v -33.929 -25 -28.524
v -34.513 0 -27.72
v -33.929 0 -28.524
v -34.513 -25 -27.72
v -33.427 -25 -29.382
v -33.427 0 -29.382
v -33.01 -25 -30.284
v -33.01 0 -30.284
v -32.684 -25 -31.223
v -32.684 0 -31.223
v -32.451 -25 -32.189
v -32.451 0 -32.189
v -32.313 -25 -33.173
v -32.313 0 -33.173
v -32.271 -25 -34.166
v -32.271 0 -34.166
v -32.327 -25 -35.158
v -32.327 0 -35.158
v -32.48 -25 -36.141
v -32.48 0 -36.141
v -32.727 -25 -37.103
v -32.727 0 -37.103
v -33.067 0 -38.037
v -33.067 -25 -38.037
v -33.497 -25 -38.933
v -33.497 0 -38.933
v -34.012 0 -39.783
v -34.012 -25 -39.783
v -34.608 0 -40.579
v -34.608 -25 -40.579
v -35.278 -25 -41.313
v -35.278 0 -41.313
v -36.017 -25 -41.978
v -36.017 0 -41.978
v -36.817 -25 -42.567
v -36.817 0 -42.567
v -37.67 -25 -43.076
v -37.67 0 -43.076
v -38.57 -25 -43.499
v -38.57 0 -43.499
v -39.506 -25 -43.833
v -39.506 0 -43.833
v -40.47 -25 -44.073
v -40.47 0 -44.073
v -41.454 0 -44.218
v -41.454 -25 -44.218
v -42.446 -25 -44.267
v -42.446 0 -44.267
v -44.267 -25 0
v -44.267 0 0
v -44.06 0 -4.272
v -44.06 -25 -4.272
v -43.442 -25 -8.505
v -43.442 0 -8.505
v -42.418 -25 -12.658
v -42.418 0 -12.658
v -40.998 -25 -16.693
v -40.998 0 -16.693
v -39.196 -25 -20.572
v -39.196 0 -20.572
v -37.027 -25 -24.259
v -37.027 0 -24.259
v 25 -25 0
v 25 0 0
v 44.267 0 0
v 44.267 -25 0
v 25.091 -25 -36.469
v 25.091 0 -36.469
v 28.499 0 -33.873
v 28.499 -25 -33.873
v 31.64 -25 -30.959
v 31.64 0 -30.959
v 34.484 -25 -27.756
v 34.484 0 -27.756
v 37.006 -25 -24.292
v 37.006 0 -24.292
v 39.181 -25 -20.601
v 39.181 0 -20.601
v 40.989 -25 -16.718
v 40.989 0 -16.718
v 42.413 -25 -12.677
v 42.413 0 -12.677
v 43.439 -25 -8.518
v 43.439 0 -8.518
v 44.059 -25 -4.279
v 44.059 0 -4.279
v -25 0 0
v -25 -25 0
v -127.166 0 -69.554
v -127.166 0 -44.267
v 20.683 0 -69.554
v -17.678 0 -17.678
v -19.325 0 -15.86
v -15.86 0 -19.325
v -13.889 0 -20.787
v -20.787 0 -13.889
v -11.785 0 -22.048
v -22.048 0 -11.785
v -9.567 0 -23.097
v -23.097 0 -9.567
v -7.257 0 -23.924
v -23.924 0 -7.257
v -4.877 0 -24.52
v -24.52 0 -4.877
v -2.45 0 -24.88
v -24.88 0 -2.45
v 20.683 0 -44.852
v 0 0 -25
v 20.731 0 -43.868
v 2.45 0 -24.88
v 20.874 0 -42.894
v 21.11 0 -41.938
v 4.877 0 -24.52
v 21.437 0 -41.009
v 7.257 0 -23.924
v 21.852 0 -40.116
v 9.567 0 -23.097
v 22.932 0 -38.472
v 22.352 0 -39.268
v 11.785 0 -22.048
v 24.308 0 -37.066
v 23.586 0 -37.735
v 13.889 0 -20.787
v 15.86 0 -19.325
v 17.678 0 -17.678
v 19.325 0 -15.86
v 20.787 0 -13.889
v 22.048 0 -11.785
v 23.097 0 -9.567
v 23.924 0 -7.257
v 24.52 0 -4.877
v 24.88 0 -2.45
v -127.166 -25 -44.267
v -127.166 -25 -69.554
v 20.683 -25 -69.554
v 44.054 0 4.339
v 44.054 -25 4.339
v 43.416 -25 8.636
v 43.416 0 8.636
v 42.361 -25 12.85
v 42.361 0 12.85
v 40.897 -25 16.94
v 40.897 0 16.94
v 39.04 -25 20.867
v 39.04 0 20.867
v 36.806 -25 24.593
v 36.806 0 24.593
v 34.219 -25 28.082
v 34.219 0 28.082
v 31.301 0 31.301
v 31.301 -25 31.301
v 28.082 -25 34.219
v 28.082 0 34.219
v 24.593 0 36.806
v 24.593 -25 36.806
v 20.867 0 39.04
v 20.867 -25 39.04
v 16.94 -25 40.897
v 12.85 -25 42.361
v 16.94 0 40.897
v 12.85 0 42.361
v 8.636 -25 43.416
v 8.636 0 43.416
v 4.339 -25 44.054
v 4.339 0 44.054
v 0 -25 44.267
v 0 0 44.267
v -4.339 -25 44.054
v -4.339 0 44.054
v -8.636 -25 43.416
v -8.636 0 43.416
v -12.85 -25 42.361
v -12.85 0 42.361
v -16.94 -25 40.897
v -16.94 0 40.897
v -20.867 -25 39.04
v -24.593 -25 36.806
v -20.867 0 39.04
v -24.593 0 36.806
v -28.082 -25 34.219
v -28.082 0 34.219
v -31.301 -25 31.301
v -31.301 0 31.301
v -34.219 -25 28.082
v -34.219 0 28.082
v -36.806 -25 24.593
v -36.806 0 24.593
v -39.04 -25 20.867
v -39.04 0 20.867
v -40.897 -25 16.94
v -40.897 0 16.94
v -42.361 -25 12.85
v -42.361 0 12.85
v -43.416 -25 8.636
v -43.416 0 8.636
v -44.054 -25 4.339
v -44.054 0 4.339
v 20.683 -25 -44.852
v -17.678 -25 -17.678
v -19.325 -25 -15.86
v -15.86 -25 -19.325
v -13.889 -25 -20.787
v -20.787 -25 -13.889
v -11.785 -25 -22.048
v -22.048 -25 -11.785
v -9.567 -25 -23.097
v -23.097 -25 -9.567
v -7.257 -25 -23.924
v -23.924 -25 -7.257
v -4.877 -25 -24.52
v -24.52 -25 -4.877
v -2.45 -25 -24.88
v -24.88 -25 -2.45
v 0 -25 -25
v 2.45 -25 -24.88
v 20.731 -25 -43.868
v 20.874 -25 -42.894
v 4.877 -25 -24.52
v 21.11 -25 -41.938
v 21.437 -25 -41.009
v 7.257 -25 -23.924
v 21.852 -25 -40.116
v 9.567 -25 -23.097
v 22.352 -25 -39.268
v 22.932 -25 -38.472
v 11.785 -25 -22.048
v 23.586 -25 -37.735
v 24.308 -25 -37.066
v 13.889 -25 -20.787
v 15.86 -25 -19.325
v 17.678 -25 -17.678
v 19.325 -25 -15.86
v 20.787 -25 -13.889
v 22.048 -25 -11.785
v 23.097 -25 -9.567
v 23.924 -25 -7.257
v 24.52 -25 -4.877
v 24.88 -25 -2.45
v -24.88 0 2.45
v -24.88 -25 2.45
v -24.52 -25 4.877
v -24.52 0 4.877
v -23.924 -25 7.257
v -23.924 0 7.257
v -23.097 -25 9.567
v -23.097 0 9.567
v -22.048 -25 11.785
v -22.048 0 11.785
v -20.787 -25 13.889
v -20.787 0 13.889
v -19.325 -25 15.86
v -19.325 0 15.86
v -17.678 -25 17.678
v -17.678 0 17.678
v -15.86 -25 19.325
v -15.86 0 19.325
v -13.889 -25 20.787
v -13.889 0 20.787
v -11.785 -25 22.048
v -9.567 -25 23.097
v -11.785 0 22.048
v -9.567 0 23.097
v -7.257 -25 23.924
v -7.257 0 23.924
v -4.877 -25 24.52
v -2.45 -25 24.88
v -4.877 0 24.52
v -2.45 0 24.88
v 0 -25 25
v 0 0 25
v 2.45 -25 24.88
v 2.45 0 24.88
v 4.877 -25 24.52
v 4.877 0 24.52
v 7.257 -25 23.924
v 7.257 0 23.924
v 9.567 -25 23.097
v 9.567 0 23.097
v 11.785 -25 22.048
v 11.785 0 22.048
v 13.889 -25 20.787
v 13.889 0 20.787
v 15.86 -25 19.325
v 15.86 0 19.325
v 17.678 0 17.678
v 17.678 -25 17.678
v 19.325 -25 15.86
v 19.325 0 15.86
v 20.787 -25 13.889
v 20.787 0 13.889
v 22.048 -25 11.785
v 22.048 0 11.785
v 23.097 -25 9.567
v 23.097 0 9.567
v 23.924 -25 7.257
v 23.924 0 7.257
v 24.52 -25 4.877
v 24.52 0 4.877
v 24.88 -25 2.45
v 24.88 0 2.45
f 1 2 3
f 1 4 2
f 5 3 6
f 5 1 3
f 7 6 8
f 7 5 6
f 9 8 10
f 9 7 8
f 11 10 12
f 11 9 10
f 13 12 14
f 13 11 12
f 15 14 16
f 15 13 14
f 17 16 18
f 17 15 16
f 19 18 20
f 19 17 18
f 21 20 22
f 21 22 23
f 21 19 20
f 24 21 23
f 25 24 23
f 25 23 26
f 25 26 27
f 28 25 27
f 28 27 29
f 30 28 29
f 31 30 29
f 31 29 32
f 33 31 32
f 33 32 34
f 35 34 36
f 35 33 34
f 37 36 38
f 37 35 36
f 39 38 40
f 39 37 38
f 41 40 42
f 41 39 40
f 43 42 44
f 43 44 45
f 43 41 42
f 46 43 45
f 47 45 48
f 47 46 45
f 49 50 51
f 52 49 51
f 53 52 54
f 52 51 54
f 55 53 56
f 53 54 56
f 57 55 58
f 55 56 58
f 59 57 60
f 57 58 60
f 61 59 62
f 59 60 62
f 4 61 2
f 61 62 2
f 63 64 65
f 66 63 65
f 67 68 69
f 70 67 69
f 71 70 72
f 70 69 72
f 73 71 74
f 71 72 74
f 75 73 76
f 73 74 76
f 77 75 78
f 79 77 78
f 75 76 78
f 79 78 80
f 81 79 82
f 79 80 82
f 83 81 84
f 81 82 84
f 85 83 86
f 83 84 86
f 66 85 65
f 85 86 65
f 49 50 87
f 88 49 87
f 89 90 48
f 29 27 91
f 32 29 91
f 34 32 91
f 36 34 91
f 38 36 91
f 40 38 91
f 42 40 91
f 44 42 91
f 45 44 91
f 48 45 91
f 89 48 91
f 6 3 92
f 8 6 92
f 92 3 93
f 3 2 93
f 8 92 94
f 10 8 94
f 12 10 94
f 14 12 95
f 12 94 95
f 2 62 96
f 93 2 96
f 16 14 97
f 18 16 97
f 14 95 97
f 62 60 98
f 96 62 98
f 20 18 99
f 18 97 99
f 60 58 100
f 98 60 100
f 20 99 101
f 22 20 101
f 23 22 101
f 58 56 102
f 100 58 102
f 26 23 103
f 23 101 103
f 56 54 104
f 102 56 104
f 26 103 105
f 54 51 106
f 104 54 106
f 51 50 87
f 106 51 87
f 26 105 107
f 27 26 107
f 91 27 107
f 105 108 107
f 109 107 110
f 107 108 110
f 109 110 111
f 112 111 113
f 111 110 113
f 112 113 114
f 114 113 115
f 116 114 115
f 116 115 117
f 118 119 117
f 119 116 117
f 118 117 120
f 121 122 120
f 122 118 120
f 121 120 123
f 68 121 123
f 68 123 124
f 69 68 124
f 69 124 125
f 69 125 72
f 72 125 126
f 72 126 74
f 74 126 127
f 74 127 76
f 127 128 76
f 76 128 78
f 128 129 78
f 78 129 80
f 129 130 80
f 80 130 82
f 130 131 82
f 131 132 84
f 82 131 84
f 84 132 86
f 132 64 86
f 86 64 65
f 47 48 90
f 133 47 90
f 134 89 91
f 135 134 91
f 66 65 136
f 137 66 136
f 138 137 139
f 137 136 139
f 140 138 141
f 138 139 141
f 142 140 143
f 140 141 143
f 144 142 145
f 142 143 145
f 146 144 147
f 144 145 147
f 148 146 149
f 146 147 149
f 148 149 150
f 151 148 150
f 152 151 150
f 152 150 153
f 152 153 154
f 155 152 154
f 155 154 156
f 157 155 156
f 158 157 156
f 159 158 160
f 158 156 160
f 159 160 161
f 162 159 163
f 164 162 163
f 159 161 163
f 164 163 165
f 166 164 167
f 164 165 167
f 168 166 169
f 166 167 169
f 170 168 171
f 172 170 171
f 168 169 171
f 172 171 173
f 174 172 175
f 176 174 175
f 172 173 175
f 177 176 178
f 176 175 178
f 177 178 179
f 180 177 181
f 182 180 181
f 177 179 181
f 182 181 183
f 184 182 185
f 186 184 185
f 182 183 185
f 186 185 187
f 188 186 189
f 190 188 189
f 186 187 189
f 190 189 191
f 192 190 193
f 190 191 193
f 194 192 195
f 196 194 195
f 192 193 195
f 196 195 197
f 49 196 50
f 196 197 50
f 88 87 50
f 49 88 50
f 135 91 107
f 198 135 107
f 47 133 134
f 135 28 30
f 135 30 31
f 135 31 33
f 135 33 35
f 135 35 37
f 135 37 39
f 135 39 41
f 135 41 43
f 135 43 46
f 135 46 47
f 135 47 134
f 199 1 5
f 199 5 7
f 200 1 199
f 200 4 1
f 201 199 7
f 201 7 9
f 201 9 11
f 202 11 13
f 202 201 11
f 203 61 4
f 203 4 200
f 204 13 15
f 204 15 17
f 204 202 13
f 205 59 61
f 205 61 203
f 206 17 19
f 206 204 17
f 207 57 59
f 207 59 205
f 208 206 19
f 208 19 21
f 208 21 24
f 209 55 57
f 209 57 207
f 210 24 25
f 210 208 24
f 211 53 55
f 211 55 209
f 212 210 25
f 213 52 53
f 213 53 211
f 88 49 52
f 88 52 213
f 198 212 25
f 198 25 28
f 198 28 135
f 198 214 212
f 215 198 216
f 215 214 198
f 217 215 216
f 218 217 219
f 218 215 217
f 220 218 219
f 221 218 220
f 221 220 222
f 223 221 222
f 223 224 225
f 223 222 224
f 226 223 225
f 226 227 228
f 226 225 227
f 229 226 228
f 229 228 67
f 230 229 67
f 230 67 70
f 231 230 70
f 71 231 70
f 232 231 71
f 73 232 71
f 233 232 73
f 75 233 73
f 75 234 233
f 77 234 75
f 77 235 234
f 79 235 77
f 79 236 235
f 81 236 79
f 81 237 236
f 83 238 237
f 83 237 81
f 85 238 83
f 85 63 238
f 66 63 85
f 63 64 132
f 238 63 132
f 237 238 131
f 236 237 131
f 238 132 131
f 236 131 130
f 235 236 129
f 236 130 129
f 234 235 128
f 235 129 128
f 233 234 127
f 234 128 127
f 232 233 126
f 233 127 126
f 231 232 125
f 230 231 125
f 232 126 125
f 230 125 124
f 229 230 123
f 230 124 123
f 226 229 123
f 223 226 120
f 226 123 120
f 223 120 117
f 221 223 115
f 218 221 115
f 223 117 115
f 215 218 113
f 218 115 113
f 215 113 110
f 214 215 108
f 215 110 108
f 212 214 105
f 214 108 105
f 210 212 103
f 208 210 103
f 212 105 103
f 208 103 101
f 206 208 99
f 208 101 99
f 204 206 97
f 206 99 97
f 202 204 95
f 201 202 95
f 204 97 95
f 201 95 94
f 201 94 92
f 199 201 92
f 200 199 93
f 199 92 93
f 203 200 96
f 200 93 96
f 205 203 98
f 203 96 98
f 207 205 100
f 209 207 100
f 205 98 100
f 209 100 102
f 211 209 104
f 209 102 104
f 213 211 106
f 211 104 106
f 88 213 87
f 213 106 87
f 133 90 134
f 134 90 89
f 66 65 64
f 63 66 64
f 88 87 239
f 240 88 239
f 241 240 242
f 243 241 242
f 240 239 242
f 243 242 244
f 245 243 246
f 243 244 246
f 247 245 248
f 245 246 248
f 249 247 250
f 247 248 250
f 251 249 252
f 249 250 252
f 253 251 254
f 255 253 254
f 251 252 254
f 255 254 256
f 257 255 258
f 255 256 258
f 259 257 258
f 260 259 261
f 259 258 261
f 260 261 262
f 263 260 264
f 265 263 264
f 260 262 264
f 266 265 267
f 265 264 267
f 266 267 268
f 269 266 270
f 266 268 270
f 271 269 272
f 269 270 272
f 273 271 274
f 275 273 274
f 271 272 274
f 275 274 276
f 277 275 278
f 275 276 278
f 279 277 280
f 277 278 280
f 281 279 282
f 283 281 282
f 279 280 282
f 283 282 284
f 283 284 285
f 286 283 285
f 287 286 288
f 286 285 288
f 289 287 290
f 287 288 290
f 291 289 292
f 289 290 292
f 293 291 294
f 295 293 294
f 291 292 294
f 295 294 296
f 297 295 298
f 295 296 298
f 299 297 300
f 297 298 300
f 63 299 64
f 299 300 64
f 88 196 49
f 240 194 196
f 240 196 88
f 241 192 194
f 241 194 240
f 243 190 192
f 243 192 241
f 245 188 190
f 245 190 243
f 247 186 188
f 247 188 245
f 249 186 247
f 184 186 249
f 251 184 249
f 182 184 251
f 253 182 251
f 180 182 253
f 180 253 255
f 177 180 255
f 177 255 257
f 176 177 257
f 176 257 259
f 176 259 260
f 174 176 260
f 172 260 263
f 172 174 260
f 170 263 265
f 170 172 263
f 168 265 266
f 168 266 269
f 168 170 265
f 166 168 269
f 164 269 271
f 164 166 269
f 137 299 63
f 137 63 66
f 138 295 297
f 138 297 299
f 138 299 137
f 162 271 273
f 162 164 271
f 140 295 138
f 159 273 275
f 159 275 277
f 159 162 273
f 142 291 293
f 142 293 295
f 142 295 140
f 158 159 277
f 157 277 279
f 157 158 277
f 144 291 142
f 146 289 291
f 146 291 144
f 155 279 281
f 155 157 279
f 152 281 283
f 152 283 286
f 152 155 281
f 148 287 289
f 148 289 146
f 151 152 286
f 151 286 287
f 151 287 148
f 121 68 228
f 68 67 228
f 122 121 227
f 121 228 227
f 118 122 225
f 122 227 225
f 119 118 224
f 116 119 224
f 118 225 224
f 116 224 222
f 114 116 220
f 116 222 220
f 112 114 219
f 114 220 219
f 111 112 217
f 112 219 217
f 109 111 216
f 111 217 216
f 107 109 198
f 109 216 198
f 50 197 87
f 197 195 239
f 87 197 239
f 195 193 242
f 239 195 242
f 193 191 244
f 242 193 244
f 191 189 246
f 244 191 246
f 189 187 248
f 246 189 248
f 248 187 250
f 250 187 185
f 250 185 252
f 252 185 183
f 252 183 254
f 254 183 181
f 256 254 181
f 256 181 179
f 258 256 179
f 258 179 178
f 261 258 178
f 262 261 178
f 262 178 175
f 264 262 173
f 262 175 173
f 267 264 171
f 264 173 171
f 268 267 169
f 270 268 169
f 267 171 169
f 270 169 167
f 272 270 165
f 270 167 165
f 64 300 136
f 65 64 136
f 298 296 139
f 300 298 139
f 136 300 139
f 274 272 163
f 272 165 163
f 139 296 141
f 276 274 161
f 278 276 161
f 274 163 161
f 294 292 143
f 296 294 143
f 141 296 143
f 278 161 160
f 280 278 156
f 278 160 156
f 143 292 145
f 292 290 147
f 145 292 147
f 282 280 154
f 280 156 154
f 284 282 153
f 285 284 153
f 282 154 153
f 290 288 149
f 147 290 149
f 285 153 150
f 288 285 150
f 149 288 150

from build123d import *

# Parameters (mm, degrees)
F1_DEPTH = 25
F2_DEPTH = 25
F3_R     = 10.1752029192


# Not quite as in the source:
# - a feature names something its author has since deleted; it is built from what else it names


with BuildPart() as f1:
    # F0 (on Front) → F1 (new body)
    with BuildSketch(Plane.XZ):
        with BuildLine():
            Line((20.6833779812, -69.5540085435), (20.6833779812, -39.1374016096))
            ThreePointArc((20.6833779812, -39.1374016096), (10.6549466055, -42.9652236384), (0, -44.2666728981))
            Line((0, -44.2666728981), (-127.1657443379, -44.2666728981))
            Line((-127.1657443379, -44.2666728981), (-127.1657443379, -69.5540085435))
            Line((-127.1657443379, -69.5540085435), (20.6833779812, -69.5540085435))
        make_face()
    extrude(amount=F1_DEPTH)

    # F0 (on Front) → F2 (join)
    with BuildSketch(Plane.XZ):
        with BuildLine():
            Line((44.2666728981, 0), (25, 0))
            ThreePointArc((25, 0), (0, -25), (-25, 0))
            Line((-25, 0), (-44.2666728981, 0))
            ThreePointArc((-44.2666728981, 0), (-31.3012645868, -31.3012645868), (0, -44.2666728981))
            ThreePointArc((0, -44.2666728981), (10.6549466055, -42.9652236384), (20.6833779812, -39.1374016096))
            ThreePointArc((20.6833779812, -39.1374016096), (37.9151859879, -22.846815992), (44.2666728981, 0))
        make_face()
    extrude(amount=F2_DEPTH)

    # F3
    f3_edges = [f1.edges().sort_by_distance(p)[0] for p in [
        (0, -12.5, -44.266673),
        (20.683378, -12.5, -39.137402),
    ]]
    fillet(f3_edges, radius=F3_R)


with BuildPart() as f1b:
    # F0 (on Front) → F1, piece 2 (new body)
    with BuildSketch(Plane.XZ):
        with BuildLine():
            ThreePointArc((-25, 0), (0, 25), (25, 0))
            Line((25, 0), (44.2666728981, 0))
            ThreePointArc((44.2666728981, 0), (0, 44.2666728981), (-44.2666728981, 0))
            Line((-44.2666728981, 0), (-25, 0))
        make_face()
    extrude(amount=F1_DEPTH)


solid = Compound([f1.part, f1b.part])
